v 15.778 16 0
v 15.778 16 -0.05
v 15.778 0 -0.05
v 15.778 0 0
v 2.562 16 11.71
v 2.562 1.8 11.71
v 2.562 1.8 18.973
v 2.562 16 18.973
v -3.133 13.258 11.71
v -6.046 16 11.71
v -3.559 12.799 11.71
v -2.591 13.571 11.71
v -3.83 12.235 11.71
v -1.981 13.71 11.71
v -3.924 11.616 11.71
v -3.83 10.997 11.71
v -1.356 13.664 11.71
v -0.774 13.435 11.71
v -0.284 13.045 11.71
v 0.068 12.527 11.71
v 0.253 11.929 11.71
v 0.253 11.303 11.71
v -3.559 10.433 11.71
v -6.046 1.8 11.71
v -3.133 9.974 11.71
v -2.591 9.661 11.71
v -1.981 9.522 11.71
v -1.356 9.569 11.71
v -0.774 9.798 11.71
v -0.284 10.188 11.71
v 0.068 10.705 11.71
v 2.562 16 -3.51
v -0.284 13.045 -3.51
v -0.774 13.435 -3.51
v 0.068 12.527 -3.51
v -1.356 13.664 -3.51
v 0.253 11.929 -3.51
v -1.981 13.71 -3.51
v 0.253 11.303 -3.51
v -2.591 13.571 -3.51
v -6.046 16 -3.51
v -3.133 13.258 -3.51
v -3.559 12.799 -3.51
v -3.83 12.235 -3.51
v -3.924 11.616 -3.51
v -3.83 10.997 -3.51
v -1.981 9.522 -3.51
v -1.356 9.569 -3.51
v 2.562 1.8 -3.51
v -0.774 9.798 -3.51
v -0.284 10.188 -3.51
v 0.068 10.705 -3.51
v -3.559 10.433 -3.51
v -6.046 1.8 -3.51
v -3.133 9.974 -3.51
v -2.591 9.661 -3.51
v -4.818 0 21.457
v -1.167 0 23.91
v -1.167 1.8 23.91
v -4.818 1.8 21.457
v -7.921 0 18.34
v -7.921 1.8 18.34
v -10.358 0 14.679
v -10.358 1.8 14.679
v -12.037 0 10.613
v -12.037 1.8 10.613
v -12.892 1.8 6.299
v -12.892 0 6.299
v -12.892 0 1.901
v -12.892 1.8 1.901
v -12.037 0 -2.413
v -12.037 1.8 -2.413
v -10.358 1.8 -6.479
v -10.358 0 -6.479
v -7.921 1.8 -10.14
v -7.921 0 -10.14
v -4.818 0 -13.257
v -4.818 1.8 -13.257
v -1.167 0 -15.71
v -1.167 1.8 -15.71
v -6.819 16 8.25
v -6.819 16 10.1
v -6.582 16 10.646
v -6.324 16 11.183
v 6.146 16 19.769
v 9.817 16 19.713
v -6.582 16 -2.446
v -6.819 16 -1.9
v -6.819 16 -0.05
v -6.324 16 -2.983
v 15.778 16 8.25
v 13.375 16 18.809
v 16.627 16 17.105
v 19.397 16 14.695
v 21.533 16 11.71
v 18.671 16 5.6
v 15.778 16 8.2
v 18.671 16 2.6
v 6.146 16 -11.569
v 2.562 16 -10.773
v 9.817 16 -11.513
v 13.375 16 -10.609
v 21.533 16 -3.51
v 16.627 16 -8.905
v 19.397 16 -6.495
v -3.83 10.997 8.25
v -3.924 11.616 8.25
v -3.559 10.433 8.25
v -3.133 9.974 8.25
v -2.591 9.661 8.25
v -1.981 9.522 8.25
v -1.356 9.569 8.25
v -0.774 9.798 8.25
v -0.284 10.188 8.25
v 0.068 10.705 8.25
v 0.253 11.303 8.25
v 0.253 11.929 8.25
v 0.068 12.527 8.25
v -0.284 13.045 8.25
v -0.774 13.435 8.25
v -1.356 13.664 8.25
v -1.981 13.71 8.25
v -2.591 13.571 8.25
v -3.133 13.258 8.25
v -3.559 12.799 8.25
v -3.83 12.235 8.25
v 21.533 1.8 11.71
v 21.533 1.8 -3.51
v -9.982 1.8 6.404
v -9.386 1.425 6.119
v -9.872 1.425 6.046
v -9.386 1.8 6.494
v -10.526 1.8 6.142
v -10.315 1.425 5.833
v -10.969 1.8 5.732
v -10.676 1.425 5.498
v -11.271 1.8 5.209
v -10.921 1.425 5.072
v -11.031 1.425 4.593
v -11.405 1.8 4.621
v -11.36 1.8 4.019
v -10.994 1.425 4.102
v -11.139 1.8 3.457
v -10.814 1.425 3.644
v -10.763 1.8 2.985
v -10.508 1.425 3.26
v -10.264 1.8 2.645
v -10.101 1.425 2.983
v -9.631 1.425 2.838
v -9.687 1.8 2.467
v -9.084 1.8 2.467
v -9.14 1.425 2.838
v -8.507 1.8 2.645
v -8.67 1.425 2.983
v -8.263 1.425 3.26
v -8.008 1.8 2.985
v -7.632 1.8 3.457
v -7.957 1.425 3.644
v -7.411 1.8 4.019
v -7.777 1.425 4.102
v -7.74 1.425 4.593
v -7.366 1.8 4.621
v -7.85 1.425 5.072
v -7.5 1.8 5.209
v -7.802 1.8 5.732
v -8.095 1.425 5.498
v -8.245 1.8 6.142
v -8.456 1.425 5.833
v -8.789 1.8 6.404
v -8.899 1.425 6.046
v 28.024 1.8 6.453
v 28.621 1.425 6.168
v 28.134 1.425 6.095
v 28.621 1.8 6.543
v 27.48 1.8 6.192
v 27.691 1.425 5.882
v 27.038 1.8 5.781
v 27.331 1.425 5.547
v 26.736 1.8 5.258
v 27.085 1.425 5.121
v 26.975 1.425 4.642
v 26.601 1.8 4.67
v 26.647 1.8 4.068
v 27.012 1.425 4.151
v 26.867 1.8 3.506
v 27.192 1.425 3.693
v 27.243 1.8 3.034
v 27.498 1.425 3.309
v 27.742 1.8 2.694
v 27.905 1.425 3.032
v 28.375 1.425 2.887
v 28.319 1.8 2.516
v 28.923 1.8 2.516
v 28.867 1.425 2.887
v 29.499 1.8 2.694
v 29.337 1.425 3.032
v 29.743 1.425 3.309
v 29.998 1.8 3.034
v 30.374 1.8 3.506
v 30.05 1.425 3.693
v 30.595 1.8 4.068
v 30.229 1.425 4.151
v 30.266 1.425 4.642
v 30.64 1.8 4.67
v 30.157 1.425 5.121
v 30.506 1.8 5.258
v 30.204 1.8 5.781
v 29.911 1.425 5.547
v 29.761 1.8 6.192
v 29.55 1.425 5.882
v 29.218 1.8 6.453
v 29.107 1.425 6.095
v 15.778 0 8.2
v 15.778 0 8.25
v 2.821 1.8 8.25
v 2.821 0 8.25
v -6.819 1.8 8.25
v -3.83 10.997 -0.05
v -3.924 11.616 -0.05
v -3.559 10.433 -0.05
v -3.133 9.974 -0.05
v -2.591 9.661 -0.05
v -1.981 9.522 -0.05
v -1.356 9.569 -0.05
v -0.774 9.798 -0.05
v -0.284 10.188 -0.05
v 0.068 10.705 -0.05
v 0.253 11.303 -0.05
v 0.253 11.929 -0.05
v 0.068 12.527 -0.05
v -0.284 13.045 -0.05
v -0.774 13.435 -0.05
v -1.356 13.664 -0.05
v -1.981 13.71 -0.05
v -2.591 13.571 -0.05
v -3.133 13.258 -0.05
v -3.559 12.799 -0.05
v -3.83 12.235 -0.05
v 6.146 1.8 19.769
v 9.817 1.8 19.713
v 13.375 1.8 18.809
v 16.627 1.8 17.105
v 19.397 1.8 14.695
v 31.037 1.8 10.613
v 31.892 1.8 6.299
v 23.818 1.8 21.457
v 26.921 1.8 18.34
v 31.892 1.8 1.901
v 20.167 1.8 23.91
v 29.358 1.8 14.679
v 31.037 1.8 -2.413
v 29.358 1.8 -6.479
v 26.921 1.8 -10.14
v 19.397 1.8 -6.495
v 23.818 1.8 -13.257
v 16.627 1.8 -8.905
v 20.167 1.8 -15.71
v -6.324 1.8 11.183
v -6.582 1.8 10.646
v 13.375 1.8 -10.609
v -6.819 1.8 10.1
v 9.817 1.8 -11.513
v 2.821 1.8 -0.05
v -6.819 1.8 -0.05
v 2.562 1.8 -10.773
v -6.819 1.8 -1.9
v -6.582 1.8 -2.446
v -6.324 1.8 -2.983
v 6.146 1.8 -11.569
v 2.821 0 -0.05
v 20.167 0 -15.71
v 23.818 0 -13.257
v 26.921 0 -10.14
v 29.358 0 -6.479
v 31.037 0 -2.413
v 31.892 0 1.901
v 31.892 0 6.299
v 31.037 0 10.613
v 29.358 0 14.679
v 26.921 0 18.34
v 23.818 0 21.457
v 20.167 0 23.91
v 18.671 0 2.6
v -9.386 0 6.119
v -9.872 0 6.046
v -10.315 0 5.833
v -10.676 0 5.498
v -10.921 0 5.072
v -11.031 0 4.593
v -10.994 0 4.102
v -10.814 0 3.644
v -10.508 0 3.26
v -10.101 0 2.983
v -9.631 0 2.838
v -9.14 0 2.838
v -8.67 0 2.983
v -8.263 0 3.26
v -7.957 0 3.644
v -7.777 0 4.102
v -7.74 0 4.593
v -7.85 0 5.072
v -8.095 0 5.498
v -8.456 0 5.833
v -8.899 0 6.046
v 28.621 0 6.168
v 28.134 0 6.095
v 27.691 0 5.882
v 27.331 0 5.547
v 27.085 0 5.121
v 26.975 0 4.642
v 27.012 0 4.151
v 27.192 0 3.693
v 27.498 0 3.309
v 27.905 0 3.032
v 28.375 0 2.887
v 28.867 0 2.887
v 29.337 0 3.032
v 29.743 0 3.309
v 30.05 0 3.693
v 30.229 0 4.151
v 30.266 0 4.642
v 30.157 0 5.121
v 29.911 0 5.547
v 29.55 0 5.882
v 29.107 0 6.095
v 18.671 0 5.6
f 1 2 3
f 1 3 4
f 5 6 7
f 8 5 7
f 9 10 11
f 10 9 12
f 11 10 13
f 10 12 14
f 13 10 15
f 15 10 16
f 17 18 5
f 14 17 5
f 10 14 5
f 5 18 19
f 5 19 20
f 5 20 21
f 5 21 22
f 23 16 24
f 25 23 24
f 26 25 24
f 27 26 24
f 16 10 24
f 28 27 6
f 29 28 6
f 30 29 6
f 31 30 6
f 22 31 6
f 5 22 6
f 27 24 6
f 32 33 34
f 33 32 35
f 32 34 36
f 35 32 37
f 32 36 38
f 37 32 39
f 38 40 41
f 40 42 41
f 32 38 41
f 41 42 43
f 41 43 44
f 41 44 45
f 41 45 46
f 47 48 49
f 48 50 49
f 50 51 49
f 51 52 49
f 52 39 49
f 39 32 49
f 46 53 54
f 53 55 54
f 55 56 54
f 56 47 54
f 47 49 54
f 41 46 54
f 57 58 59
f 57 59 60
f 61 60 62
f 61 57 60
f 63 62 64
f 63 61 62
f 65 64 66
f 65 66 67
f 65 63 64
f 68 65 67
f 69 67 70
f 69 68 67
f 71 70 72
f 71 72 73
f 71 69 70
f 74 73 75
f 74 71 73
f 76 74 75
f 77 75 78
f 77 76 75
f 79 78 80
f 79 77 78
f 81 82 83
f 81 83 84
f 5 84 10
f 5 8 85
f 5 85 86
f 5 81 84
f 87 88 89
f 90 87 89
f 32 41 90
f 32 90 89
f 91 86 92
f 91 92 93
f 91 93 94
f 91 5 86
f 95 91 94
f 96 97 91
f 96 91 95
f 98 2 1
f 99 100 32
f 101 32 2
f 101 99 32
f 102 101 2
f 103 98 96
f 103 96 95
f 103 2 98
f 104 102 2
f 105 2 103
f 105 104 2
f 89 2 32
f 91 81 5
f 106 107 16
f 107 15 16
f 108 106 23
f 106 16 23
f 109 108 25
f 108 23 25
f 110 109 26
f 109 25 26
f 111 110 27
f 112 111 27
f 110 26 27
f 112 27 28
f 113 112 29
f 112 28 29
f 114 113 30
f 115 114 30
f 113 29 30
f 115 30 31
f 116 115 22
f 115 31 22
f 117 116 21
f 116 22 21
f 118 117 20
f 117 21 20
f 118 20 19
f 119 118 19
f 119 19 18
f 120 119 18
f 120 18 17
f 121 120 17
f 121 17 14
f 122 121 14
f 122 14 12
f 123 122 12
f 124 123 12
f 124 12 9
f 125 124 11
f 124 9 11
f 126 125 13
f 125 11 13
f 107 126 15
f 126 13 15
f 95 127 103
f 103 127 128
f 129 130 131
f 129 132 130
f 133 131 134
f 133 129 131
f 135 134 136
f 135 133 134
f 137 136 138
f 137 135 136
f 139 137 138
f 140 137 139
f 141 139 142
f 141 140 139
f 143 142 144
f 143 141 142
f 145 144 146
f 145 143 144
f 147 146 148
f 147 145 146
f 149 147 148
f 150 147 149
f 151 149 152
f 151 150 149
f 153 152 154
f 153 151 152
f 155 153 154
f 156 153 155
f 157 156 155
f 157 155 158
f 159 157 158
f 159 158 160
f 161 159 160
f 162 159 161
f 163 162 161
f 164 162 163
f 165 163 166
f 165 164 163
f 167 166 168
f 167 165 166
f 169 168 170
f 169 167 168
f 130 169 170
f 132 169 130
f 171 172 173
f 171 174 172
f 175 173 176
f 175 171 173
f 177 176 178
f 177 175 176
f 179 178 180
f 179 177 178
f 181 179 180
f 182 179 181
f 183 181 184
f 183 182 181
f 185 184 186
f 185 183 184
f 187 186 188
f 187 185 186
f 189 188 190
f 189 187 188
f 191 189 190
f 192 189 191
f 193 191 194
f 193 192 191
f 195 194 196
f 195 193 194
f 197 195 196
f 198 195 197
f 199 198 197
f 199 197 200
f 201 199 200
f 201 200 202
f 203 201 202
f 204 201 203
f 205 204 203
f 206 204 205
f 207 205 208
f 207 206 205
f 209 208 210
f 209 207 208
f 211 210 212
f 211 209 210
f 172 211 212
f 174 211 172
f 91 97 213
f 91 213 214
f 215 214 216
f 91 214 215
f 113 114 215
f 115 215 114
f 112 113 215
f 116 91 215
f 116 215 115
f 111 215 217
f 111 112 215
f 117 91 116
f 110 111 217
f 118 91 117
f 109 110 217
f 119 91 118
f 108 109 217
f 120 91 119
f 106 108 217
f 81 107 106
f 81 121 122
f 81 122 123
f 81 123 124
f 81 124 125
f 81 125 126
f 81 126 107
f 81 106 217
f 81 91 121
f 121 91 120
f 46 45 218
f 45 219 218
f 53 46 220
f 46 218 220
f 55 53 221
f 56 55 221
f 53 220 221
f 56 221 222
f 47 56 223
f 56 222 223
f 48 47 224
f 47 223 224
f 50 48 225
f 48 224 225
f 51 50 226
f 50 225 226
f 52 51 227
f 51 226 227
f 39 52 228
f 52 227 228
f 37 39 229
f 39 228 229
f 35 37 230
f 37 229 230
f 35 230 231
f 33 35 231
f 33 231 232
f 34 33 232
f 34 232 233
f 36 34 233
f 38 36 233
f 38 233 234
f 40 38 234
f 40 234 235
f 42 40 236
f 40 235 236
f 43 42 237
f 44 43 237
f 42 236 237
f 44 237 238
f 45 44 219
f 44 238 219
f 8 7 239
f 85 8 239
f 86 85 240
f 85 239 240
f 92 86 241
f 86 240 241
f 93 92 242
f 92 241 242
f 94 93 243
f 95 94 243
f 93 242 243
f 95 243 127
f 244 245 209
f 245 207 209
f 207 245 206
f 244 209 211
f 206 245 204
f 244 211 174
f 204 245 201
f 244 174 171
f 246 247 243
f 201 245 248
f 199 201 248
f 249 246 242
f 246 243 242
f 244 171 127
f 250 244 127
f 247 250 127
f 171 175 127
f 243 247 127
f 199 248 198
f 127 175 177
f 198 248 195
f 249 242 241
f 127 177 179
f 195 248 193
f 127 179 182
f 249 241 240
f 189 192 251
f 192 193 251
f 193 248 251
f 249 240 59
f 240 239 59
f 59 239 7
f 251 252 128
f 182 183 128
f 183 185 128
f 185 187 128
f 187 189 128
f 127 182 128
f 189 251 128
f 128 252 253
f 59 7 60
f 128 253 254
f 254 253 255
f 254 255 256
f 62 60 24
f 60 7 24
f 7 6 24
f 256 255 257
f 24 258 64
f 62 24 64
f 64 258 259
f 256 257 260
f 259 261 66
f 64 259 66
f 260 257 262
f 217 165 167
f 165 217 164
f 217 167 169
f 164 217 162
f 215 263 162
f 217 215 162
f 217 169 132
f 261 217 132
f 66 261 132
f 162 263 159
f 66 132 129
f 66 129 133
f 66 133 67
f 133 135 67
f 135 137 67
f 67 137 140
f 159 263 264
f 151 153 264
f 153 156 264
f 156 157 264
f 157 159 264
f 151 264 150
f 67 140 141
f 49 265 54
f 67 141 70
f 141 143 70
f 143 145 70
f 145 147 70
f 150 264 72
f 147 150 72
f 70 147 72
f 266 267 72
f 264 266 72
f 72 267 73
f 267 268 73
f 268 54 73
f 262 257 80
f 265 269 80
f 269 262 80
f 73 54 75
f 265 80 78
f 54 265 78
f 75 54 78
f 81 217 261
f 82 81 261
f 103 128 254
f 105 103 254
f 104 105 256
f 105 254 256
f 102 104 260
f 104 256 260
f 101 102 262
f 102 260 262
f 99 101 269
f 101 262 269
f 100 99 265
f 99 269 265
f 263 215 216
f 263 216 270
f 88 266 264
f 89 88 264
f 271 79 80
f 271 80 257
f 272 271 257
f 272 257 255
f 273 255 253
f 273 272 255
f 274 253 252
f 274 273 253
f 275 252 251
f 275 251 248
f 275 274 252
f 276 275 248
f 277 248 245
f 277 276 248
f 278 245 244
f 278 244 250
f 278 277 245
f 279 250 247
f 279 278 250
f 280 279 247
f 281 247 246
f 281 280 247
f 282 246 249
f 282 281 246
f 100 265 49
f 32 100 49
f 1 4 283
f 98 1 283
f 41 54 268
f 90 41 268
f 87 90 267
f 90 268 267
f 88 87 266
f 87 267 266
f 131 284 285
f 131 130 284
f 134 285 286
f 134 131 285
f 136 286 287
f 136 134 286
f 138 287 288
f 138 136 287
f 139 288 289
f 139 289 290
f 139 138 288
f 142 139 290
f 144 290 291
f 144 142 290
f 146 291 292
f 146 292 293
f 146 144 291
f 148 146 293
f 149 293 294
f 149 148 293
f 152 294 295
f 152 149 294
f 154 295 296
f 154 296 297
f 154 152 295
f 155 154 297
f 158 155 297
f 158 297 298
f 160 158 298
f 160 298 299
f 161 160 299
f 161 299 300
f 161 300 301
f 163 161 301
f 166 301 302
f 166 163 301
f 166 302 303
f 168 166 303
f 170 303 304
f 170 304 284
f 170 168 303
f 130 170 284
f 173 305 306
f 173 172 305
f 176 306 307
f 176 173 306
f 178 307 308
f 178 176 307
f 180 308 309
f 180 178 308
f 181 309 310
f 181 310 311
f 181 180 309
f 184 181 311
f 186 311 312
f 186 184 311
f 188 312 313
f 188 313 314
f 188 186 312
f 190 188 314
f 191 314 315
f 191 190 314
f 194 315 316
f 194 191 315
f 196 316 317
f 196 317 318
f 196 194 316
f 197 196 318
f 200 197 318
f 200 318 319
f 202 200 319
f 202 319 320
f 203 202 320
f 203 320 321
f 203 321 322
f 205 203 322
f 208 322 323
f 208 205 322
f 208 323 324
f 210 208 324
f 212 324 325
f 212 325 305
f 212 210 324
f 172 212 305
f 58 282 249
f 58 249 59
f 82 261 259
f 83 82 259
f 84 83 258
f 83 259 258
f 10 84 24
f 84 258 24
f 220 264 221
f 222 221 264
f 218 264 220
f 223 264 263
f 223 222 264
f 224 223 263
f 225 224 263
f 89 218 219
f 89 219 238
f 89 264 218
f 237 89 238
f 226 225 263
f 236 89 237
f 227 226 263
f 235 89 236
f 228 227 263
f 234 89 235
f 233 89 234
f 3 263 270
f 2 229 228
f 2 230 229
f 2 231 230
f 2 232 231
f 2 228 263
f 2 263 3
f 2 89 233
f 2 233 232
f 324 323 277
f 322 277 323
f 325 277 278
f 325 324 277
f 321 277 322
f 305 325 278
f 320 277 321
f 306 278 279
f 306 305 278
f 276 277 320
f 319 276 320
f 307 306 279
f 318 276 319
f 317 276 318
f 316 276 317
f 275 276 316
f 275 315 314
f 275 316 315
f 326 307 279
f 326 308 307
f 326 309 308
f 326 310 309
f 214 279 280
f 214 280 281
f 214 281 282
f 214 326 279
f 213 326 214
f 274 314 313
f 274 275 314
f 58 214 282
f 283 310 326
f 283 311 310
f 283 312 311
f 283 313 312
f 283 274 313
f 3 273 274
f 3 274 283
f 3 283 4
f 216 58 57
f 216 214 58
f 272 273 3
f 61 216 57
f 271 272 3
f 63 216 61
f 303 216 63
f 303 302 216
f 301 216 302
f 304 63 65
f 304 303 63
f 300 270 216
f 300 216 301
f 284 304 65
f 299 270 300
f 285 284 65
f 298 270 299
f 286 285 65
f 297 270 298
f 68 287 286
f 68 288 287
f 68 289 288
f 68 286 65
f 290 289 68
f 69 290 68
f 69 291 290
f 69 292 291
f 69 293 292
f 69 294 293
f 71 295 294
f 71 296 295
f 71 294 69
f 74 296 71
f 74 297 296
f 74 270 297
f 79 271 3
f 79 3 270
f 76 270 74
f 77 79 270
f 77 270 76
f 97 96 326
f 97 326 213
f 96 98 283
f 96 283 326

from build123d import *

# Parameters (mm, degrees)
BOSS_EXTRUDE1_DEPTH         = 16
BOSS_EXTRUDE2_DEPTH         = 1.8
M4_TAPPED_HOLE1_AT_2_COUNT  = 2
M4_TAPPED_HOLE1_AT_2_PITCH  = 38.006280301
M5_TAPPED_HOLE1_D           = 4.2
M5_TAPPED_HOLE1_CSINK_D     = 5.05
M5_TAPPED_HOLE1_CSINK_ANGLE = 90
CUT_EXTRUDE1_REACH          = 45.032


with BuildPart() as part:
    # Sketch2 → Boss-Extrude1 (new body)
    with BuildSketch(Plane(origin=(0, 0, 0), x_dir=(1, 0, 0), z_dir=(0, 1, 0))):
        with BuildLine():
            Line((2.56174761, 3.509758774), (-4.43825239, 3.509758774))
            Line((-4.43825239, 3.509758774), (-6.046178238, 3.509758774))
            ThreePointArc((-6.046178238, 3.509758774), (-6.455374166, 2.715838994), (-6.818907741, 1.9))
            Line((-6.818907741, 1.9), (-6.818907741, 0.05))
            Line((-6.818907741, 0.05), (-5.306541861, 0.05))
            Line((-5.306541861, 0.05), (15.777709192, 0.05))
            Line((15.777709192, 0.05), (15.777709192, 0))
            Line((15.777709192, 0), (18.671266747, -2.599889358))
            Line((18.671266747, -2.599889358), (18.671266747, -5.599889358))
            Line((18.671266747, -5.599889358), (15.777709192, -8.199778717))
            Line((15.777709192, -8.199778717), (15.777709192, -8.25))
            Line((15.777709192, -8.25), (-5.306541861, -8.25))
            Line((-5.306541861, -8.25), (-6.818907741, -8.25))
            Line((-6.818907741, -8.25), (-6.818907741, -10.1))
            ThreePointArc((-6.818907741, -10.1), (-6.455374166, -10.915838994), (-6.046178238, -11.709758774))
            Line((-6.046178238, -11.709758774), (-4.43825239, -11.709758774))
            Line((-4.43825239, -11.709758774), (2.56174761, -11.709758774))
            Line((2.56174761, -11.709758774), (2.56174761, -17.495983577))
            Line((2.56174761, -17.495983577), (2.56174761, -18.97321001))
            ThreePointArc((2.56174761, -18.97321001), (13.37493466, -18.80880594), (21.533094515, -11.709758774))
            Line((21.533094515, -11.709758774), (21.533094515, 3.509758774))
            ThreePointArc((21.533094515, 3.509758774), (13.37493466, 10.60880594), (2.56174761, 10.77321001))
            Line((2.56174761, 10.77321001), (2.56174761, 9.295983577))
            Line((2.56174761, 9.295983577), (2.56174761, 3.509758774))
        make_face()
    extrude(amount=BOSS_EXTRUDE1_DEPTH)

    # Sketch4 → Boss-Extrude2 (add)
    with BuildSketch(Plane(origin=(0, 0, 0), x_dir=(1, 0, 0), z_dir=(0, 1, 0))):
        with BuildLine():
            Line((-1.167494267, 15.710466074), (20.167494267, 15.710466074))
            ThreePointArc((20.167494267, 15.710466074), (32, -4.1), (20.167494267, -23.910466074))
            Line((20.167494267, -23.910466074), (-1.167494267, -23.910466074))
            ThreePointArc((-1.167494267, -23.910466074), (-13, -4.1), (-1.167494267, 15.710466074))
        make_face()
    extrude(amount=BOSS_EXTRUDE2_DEPTH)

    # Sketch8 → M4 Tapped Hole1 (revolve, cut)
    with BuildSketch(Plane(origin=(28.620732779, 1.8, 4.51846258), x_dir=(0, 0, 1), z_dir=(1, 0, 0))):
        Polygon((0, 0), (0, 1.8), (1.65, 1.8), (1.65, 0.375), (2.025, 0), align=None)
    m4_tapped_hole1 = revolve(axis=Axis((28.620732779, 8.15, 4.51846258), (0, -1, 0)), mode=Mode.SUBTRACT)

    # M4 Tapped Hole1 at 2: M4 Tapped Hole1 ×2
    with Locations(*[Vector(-0.9999991610523592, 0, -0.001295335700845017) * (i * M4_TAPPED_HOLE1_AT_2_PITCH) for i in range(1, M4_TAPPED_HOLE1_AT_2_COUNT)]):
        add(m4_tapped_hole1, mode=Mode.SUBTRACT)

    # M5 Tapped Hole1 (through all)
    with Locations(Plane(origin=(0, 0, -10.05), x_dir=(1, 0, 0), z_dir=(0, 0, -1))):
        with Locations((-1.823787651, -11.616172117)):
            CounterSinkHole(M5_TAPPED_HOLE1_D / 2, M5_TAPPED_HOLE1_CSINK_D / 2, counter_sink_angle=M5_TAPPED_HOLE1_CSINK_ANGLE)

    # Sketch25 → Cut-Extrude1 (cut, up to next)
    with BuildSketch(Plane(origin=(0, 16, 0), x_dir=(1, 0, 0), z_dir=(0, 1, 0)), mode=Mode.PRIVATE) as cut_extrude1_sk1:
        Polygon((15.777709192, 0), (18.671266747, -2.599889358), (18.671266747, -5.599889358), (15.777709192, -8.199778717), (15.777709192, -8.25), (2.821266747, -8.25), (2.821266747, 0.05), (15.777709192, 0.05), align=None)
    cut_extrude1_tool1 = extrude(cut_extrude1_sk1.sketch, amount=-CUT_EXTRUDE1_REACH, mode=Mode.PRIVATE) & part.part
    add(cut_extrude1_tool1.solids().sort_by_distance((10.307921, 16, 4.099986))[0], mode=Mode.SUBTRACT)


solid = part.part
